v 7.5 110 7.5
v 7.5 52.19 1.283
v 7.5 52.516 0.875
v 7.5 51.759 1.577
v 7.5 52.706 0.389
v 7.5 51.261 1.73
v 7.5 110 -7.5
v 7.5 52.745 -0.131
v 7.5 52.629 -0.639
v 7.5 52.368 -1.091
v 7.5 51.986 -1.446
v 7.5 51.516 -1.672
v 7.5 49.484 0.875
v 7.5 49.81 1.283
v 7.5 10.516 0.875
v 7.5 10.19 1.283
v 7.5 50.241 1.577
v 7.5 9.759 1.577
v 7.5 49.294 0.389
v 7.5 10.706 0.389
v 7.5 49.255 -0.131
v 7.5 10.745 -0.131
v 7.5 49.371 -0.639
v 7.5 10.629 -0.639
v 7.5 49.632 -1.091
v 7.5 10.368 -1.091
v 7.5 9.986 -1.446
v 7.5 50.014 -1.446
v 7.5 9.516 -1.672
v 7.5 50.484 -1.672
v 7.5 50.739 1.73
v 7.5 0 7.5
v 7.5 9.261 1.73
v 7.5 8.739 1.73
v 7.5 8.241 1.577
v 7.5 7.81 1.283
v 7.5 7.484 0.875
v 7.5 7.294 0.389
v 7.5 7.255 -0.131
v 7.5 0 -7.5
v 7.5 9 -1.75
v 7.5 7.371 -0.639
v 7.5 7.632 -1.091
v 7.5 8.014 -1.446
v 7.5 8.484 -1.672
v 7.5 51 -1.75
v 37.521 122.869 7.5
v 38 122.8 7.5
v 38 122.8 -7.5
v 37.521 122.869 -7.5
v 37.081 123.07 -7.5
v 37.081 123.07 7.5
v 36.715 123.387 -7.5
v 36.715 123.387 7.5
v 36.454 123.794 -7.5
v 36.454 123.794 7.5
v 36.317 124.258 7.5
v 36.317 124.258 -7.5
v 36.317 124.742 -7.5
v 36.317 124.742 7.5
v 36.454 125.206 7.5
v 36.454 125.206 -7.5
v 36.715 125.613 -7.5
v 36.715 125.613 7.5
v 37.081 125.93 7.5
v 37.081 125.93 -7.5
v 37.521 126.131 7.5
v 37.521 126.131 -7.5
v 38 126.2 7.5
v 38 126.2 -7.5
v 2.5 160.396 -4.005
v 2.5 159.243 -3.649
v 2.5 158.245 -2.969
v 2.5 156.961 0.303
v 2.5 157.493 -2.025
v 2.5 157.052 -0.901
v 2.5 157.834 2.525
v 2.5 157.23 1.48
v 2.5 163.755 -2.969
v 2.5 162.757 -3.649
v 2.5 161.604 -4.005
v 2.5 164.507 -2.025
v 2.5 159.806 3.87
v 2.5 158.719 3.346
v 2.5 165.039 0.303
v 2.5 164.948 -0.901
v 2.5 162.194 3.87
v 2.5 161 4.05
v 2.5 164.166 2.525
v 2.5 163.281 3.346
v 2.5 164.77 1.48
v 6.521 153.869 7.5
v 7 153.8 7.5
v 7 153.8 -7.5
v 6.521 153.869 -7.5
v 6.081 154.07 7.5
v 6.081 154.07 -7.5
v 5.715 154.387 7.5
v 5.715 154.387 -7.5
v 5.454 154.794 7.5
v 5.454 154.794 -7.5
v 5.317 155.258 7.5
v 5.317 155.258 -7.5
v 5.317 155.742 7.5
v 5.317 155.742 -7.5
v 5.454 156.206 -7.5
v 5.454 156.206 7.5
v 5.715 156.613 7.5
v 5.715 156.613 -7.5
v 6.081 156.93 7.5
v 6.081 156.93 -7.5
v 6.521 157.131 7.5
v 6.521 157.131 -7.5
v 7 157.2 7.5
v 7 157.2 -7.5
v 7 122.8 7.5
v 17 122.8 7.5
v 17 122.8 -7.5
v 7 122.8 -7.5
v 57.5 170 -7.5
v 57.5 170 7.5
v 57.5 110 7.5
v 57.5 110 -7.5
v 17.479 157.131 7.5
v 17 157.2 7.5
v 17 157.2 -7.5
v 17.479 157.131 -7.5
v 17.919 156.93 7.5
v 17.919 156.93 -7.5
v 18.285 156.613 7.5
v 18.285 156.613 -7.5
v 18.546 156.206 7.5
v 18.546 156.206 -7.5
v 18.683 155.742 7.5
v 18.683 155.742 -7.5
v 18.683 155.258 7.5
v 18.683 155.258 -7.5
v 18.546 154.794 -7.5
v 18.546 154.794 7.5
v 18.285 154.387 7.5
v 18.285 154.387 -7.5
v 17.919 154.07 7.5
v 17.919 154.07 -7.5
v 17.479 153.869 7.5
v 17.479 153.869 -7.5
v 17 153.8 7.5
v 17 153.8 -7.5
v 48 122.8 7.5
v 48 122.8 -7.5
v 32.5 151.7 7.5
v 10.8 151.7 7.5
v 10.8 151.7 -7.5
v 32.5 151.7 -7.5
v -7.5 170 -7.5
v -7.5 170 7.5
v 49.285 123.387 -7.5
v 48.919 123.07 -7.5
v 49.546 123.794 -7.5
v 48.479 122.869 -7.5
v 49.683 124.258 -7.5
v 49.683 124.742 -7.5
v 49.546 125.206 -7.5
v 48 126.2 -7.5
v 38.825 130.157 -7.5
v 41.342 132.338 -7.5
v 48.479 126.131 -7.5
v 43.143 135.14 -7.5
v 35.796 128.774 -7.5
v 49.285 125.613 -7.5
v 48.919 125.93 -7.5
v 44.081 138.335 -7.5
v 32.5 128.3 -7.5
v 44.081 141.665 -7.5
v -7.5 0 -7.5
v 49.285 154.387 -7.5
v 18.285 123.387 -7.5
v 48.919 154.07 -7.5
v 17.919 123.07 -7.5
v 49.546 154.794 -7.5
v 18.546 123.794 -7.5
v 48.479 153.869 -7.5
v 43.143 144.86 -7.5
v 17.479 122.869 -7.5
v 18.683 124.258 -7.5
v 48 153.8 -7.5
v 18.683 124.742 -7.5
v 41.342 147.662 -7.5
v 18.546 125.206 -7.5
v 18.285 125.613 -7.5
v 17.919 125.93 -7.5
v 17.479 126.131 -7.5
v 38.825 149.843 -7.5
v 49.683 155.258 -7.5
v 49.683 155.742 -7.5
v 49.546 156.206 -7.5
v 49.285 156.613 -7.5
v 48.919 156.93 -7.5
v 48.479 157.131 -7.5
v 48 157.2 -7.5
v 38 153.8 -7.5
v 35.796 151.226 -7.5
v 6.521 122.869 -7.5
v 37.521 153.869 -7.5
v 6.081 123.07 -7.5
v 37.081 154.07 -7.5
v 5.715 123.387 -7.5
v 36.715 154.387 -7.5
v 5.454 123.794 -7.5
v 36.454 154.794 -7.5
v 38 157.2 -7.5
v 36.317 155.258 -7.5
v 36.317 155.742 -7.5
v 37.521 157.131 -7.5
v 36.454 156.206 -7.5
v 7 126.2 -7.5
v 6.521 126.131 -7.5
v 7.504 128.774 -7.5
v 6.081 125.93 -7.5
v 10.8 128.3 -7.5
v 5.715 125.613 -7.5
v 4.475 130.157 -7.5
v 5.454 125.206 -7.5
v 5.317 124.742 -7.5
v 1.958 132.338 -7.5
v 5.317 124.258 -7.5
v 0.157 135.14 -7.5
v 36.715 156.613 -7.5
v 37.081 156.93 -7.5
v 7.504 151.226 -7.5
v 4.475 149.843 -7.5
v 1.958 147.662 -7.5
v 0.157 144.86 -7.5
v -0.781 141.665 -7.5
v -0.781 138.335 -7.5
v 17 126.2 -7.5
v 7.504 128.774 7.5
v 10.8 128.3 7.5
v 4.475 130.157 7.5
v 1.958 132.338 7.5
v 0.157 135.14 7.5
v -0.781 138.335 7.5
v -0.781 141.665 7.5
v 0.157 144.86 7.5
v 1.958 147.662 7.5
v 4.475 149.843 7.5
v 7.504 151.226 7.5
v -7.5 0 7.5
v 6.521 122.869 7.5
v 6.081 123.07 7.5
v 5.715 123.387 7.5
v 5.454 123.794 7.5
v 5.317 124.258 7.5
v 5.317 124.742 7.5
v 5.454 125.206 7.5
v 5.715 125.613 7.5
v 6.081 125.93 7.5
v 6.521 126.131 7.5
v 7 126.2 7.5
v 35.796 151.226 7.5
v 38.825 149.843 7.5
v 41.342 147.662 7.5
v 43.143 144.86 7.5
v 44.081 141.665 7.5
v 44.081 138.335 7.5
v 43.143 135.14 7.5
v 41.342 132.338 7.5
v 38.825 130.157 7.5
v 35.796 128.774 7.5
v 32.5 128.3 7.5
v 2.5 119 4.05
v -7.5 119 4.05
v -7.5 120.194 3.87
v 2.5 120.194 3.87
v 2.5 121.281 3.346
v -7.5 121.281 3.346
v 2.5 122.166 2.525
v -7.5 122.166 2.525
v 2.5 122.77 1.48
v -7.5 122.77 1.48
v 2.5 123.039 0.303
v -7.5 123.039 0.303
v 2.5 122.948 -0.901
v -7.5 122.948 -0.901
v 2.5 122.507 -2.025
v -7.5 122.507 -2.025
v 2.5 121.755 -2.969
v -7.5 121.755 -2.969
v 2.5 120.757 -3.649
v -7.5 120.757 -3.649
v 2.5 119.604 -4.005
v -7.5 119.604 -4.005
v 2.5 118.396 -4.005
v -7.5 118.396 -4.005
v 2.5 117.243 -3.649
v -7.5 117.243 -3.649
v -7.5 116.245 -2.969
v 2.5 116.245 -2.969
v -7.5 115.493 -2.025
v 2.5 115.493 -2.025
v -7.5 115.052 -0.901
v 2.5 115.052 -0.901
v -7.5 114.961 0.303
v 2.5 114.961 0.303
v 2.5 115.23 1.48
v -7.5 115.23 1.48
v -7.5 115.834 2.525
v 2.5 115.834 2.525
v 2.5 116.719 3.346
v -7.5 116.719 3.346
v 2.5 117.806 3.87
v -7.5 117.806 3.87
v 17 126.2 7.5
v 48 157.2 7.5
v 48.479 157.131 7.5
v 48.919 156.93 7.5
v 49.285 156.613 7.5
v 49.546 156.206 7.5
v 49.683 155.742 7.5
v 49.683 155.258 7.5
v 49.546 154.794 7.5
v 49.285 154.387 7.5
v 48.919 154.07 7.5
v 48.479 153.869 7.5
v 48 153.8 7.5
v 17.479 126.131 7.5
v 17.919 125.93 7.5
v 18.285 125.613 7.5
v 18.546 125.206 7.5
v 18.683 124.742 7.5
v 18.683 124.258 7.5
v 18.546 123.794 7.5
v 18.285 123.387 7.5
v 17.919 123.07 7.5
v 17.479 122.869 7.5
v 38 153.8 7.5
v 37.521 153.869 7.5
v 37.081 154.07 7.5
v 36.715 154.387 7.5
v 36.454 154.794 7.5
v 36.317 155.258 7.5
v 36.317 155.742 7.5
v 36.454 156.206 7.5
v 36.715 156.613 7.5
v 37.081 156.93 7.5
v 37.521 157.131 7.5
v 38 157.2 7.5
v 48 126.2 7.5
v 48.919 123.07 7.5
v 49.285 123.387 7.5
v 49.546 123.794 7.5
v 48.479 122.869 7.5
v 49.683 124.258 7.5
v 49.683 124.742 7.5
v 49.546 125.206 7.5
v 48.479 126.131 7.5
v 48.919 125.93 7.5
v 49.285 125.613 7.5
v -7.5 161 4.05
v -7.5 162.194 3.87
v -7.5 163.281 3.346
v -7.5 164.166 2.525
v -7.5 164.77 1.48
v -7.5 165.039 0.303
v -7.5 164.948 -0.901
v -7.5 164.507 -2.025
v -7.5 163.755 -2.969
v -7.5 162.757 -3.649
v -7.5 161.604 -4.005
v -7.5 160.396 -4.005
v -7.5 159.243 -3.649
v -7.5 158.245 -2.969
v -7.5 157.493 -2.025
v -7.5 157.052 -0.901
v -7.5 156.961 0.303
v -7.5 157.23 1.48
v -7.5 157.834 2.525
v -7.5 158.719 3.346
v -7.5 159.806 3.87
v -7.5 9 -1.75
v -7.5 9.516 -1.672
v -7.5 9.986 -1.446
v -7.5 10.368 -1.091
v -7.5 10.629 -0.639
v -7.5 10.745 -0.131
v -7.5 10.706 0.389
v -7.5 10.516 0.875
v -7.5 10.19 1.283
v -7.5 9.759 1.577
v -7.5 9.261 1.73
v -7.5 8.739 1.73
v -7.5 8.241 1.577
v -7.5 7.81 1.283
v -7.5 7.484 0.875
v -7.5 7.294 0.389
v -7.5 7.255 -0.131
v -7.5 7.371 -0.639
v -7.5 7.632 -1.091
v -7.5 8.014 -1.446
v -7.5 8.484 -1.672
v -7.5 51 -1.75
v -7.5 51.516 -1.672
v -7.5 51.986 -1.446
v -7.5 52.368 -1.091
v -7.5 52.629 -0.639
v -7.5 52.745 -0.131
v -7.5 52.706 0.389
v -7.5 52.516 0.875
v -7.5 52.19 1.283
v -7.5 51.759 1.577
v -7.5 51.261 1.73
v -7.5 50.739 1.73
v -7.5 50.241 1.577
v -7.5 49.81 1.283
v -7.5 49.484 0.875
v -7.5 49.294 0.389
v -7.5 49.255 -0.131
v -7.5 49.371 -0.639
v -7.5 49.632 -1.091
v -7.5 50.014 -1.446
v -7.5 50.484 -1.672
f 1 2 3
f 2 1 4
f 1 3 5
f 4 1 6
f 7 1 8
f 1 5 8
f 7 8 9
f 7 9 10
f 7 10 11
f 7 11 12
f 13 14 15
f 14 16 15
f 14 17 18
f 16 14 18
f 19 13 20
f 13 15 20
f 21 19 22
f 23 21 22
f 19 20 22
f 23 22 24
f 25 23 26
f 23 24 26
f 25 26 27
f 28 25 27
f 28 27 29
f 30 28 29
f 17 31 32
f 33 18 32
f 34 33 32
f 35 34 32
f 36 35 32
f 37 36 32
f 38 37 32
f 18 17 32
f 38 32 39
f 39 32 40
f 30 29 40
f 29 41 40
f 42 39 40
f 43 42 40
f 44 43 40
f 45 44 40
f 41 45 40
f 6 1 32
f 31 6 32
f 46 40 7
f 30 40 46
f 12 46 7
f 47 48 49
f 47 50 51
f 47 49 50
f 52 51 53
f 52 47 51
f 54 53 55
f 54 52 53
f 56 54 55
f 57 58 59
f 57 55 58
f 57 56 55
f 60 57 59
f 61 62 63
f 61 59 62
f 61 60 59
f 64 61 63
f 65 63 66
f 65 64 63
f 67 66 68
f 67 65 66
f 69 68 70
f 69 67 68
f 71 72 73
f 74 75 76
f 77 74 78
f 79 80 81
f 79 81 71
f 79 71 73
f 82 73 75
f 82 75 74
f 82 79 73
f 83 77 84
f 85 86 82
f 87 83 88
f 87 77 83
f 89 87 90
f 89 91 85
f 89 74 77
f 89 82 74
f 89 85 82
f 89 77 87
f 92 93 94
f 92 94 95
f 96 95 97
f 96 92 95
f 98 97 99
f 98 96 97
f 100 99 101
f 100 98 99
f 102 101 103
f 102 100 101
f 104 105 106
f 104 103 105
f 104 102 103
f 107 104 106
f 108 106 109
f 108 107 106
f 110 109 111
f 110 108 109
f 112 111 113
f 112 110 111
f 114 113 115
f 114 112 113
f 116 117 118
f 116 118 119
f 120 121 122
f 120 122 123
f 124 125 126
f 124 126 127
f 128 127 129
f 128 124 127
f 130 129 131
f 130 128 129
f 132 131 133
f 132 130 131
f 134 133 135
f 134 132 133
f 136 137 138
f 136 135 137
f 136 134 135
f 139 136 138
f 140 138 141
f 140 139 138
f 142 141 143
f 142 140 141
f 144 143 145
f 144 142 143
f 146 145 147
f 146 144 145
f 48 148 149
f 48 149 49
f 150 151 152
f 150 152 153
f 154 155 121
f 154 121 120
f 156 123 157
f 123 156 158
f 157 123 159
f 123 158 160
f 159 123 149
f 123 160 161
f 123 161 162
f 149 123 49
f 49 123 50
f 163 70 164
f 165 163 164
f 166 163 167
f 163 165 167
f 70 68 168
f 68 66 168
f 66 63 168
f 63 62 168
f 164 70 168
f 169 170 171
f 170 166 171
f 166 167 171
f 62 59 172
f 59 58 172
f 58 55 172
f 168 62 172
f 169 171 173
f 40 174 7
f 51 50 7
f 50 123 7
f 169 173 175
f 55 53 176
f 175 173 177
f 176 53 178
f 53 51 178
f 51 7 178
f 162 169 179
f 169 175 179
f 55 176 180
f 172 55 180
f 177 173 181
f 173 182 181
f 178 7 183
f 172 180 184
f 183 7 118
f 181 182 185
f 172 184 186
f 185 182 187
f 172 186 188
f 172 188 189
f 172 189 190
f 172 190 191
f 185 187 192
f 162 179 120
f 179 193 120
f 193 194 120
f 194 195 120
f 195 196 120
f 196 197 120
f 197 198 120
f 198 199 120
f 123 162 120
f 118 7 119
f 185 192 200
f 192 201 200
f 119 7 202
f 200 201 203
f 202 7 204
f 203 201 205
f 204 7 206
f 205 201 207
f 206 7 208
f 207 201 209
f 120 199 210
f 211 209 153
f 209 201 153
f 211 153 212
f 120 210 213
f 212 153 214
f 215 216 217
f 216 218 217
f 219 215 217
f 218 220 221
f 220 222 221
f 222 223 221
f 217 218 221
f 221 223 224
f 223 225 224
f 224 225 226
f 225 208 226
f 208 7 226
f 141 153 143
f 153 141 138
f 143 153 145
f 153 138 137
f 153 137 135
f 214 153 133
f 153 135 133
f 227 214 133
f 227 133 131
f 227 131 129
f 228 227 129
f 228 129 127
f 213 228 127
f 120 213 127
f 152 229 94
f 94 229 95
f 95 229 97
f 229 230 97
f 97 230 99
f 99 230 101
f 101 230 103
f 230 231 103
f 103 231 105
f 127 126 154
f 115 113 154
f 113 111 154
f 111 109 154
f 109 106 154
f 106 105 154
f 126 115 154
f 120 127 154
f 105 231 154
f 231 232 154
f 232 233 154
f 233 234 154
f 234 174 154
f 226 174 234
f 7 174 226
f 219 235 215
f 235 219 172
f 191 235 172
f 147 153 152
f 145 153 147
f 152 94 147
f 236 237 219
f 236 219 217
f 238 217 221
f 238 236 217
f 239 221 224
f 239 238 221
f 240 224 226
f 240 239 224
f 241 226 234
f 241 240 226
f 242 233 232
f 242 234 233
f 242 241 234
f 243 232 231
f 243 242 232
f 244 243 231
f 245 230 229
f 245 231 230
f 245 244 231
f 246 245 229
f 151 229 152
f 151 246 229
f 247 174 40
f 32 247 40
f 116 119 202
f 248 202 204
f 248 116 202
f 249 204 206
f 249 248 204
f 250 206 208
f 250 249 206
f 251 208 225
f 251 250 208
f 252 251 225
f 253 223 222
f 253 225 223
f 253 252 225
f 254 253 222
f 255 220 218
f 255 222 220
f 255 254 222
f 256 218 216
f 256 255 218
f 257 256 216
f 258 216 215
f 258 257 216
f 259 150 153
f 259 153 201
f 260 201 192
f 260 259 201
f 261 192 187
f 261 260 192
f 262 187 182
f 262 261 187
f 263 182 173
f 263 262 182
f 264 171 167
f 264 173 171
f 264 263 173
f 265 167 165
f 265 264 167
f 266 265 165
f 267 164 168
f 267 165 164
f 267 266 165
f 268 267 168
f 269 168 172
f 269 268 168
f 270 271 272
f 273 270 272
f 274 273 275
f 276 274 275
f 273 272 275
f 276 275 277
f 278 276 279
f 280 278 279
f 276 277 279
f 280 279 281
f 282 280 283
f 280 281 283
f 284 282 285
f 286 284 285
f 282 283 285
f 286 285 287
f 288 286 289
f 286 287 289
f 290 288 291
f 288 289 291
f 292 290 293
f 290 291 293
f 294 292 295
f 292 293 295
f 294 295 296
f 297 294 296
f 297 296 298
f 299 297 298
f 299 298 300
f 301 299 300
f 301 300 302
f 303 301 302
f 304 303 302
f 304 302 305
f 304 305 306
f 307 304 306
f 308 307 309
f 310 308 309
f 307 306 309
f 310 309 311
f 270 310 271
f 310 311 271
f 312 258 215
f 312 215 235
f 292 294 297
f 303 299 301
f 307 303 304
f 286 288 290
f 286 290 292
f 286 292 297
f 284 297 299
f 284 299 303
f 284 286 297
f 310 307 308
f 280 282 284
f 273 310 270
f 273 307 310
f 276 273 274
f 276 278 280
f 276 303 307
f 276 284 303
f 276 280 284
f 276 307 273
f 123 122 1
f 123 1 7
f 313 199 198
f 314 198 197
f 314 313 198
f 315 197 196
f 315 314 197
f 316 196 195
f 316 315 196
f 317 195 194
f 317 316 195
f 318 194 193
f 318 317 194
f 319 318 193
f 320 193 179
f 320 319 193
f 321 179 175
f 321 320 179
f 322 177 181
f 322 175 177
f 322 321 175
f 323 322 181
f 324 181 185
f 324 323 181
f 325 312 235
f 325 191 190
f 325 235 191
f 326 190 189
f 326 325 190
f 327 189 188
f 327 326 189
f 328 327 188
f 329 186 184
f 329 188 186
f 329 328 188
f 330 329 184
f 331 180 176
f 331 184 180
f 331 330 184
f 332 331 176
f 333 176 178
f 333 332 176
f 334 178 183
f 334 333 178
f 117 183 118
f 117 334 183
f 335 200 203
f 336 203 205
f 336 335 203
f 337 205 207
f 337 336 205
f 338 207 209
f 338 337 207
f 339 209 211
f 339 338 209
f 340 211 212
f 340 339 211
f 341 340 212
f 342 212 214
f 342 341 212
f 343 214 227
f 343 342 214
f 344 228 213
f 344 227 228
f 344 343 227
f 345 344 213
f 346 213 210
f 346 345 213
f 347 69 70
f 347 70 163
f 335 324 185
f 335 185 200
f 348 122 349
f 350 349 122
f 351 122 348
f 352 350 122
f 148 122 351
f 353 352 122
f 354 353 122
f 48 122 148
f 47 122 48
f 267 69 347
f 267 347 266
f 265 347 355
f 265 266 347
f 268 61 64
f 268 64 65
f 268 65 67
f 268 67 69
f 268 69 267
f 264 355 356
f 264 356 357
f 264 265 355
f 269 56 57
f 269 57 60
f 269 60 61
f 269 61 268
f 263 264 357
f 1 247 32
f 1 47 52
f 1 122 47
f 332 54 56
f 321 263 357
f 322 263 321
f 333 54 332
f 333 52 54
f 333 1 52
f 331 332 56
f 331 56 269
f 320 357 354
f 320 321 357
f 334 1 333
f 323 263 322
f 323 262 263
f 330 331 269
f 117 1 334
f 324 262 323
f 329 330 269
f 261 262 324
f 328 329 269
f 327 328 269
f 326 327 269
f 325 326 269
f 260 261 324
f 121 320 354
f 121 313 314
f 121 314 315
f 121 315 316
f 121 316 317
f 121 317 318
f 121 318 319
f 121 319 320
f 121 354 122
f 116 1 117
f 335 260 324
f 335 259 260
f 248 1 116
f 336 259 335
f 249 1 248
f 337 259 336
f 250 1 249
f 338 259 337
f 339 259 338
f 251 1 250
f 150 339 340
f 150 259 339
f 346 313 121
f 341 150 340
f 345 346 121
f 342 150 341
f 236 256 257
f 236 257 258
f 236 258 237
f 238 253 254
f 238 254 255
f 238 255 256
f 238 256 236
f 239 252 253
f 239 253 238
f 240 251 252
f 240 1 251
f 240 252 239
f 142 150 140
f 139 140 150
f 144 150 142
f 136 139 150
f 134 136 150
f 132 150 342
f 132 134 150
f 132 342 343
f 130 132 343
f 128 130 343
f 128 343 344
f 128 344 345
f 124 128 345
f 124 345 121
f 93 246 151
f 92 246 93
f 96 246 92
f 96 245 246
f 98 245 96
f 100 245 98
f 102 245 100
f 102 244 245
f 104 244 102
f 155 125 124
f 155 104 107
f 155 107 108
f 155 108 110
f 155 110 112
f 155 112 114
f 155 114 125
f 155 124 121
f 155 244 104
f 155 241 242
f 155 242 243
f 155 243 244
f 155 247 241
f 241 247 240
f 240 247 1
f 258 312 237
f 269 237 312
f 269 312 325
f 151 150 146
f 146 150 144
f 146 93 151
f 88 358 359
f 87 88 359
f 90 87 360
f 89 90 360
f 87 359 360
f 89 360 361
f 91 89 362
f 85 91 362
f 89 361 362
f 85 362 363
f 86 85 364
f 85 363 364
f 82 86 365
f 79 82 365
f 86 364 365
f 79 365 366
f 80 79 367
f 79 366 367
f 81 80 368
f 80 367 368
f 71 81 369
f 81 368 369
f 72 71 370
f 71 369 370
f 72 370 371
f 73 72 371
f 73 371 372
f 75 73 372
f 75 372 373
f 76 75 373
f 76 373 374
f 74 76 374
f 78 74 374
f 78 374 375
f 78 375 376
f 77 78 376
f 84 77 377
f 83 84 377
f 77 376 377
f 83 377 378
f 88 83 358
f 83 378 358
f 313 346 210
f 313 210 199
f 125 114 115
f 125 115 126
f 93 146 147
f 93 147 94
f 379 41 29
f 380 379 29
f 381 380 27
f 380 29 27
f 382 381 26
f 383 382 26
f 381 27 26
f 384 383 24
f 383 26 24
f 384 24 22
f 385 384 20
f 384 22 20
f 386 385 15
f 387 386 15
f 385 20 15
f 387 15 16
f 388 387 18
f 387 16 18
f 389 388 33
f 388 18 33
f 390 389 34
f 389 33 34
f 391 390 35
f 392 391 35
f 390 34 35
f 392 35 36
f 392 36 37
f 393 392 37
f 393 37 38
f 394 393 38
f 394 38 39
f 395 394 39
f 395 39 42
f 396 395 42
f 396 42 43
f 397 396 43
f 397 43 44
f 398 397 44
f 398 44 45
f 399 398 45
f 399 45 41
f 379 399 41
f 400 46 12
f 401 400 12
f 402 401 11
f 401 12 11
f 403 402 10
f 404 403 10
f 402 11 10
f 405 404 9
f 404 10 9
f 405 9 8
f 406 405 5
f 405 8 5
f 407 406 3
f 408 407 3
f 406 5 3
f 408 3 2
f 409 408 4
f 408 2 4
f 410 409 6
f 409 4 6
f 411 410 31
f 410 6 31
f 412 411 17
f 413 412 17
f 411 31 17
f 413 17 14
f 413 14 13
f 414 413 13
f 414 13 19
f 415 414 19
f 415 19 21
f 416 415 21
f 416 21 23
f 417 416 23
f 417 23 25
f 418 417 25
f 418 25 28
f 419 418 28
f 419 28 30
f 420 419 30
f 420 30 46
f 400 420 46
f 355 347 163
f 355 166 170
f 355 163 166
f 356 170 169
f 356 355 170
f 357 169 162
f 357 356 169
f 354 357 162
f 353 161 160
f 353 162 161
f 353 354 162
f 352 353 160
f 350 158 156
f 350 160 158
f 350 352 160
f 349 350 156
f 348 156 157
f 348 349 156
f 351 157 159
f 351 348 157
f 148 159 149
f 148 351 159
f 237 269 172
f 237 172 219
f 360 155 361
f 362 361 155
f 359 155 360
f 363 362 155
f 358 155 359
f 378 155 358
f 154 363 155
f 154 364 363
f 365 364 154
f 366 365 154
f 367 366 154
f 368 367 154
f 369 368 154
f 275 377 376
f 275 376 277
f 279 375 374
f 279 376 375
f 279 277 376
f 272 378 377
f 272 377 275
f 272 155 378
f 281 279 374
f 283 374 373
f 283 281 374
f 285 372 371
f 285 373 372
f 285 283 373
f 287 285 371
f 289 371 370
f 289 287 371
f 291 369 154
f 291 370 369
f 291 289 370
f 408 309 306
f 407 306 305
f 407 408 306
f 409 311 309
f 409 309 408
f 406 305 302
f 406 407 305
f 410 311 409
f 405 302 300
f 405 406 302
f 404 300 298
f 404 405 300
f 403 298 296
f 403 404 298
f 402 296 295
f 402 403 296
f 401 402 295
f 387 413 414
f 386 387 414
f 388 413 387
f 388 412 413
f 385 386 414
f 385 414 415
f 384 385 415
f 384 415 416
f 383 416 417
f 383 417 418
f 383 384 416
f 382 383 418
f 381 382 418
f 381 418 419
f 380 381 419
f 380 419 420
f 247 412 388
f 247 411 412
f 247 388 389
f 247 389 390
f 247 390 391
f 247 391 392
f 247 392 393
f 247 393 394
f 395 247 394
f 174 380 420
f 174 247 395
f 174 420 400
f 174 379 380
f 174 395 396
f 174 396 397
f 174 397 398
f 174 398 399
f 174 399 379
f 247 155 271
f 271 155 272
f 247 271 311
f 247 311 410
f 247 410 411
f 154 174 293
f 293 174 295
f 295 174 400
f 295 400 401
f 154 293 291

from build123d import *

# Parameters (mm, degrees)
SKETCH1_W           = 15
SKETCH1_H           = 15
BOSS_EXTRUDE1_DEPTH = 170
SKETCH2_R           = 1.75
CUT_EXTRUDE1_DEPTH  = 16
SKETCH8_W           = 15
SKETCH8_H           = 60
BOSS_EXTRUDE2_DEPTH = 50
SKETCH9_W           = 15
SKETCH9_H           = 22
CUT_EXTRUDE2_DEPTH  = 31
SKETCH11_R          = 4.05
CUT_EXTRUDE3_DEPTH  = 10
SKETCH12_W          = 15
SKETCH12_H          = 22
BOSS_EXTRUDE3_DEPTH = 31
CUT_EXTRUDE4_DEPTH  = 16


with BuildPart() as part:
    # Sketch1 → Boss-Extrude1 (new body)
    with BuildSketch(Plane(origin=(0, 0, 0), x_dir=(1, 0, 0), z_dir=(0, 1, 0))):
        Rectangle(SKETCH1_W, SKETCH1_H)
    extrude(amount=BOSS_EXTRUDE1_DEPTH)

    # Sketch2 → Cut-Extrude1 (cut, through all)
    with BuildSketch(Plane(origin=(7.5, 0, 0), x_dir=(0, 0, -1), z_dir=(1, 0, 0))):
        with Locations((0, 9)):
            Circle(SKETCH2_R)
        with Locations((0, 51)):
            Circle(SKETCH2_R)
    extrude(amount=-CUT_EXTRUDE1_DEPTH, mode=Mode.SUBTRACT)

    # Sketch8 → Boss-Extrude2 (add)
    with BuildSketch(Plane(origin=(7.5, 0, 0), x_dir=(0, 0, -1), z_dir=(1, 0, 0))):
        with Locations((0, 140)):
            Rectangle(SKETCH8_W, SKETCH8_H)
    extrude(amount=BOSS_EXTRUDE2_DEPTH)

    # Sketch9 → Cut-Extrude2 (cut)
    with BuildSketch(Plane(origin=(57.5, 0, 0), x_dir=(0, 0, -1), z_dir=(1, 0, 0))):
        with Locations((0, 150)):
            Rectangle(SKETCH9_W, SKETCH9_H)
    extrude(amount=-CUT_EXTRUDE2_DEPTH, mode=Mode.SUBTRACT)

    # Sketch11 → Cut-Extrude3 (cut)
    with BuildSketch(Plane.ZY.offset(7.5)):
        with Locations((0, 161)):
            Circle(SKETCH11_R)
        with Locations((0, 119)):
            Circle(SKETCH11_R)
    extrude(amount=-CUT_EXTRUDE3_DEPTH, mode=Mode.SUBTRACT)

    # Sketch12 → Boss-Extrude3 (add)
    with BuildSketch(Plane(origin=(26.5, 0, 0), x_dir=(0, 0, -1), z_dir=(1, 0, 0))):
        with Locations((0, 150)):
            Rectangle(SKETCH12_W, SKETCH12_H)
    extrude(amount=BOSS_EXTRUDE3_DEPTH)

    # Sketch13 → Cut-Extrude4 (cut, through all)
    with BuildSketch(Plane.XY.offset(7.5)):
        with BuildLine():
            Line((17, 122.8), (7, 122.8))
            ThreePointArc((7, 122.8), (5.3, 124.5), (7, 126.2))
            Line((7, 126.2), (17, 126.2))
            ThreePointArc((17, 126.2), (18.7, 124.5), (17, 122.8))
        make_face()
        with BuildLine():
            Line((32.5, 128.3), (10.8, 128.3))
            ThreePointArc((10.8, 128.3), (-0.9, 140), (10.8, 151.7))
            Line((10.8, 151.7), (32.5, 151.7))
            ThreePointArc((32.5, 151.7), (44.2, 140), (32.5, 128.3))
        make_face()
        with BuildLine():
            Line((48, 122.8), (38, 122.8))
            ThreePointArc((38, 122.8), (36.3, 124.5), (38, 126.2))
            Line((38, 126.2), (48, 126.2))
            ThreePointArc((48, 126.2), (49.7, 124.5), (48, 122.8))
        make_face()
        with BuildLine():
            Line((48, 153.8), (38, 153.8))
            ThreePointArc((38, 153.8), (36.3, 155.5), (38, 157.2))
            Line((38, 157.2), (48, 157.2))
            ThreePointArc((48, 157.2), (49.7, 155.5), (48, 153.8))
        make_face()
        with BuildLine():
            Line((17, 153.8), (7, 153.8))
            ThreePointArc((7, 153.8), (5.3, 155.5), (7, 157.2))
            Line((7, 157.2), (17, 157.2))
            ThreePointArc((17, 157.2), (18.7, 155.5), (17, 153.8))
        make_face()
    extrude(amount=-CUT_EXTRUDE4_DEPTH, mode=Mode.SUBTRACT)


solid = part.part
